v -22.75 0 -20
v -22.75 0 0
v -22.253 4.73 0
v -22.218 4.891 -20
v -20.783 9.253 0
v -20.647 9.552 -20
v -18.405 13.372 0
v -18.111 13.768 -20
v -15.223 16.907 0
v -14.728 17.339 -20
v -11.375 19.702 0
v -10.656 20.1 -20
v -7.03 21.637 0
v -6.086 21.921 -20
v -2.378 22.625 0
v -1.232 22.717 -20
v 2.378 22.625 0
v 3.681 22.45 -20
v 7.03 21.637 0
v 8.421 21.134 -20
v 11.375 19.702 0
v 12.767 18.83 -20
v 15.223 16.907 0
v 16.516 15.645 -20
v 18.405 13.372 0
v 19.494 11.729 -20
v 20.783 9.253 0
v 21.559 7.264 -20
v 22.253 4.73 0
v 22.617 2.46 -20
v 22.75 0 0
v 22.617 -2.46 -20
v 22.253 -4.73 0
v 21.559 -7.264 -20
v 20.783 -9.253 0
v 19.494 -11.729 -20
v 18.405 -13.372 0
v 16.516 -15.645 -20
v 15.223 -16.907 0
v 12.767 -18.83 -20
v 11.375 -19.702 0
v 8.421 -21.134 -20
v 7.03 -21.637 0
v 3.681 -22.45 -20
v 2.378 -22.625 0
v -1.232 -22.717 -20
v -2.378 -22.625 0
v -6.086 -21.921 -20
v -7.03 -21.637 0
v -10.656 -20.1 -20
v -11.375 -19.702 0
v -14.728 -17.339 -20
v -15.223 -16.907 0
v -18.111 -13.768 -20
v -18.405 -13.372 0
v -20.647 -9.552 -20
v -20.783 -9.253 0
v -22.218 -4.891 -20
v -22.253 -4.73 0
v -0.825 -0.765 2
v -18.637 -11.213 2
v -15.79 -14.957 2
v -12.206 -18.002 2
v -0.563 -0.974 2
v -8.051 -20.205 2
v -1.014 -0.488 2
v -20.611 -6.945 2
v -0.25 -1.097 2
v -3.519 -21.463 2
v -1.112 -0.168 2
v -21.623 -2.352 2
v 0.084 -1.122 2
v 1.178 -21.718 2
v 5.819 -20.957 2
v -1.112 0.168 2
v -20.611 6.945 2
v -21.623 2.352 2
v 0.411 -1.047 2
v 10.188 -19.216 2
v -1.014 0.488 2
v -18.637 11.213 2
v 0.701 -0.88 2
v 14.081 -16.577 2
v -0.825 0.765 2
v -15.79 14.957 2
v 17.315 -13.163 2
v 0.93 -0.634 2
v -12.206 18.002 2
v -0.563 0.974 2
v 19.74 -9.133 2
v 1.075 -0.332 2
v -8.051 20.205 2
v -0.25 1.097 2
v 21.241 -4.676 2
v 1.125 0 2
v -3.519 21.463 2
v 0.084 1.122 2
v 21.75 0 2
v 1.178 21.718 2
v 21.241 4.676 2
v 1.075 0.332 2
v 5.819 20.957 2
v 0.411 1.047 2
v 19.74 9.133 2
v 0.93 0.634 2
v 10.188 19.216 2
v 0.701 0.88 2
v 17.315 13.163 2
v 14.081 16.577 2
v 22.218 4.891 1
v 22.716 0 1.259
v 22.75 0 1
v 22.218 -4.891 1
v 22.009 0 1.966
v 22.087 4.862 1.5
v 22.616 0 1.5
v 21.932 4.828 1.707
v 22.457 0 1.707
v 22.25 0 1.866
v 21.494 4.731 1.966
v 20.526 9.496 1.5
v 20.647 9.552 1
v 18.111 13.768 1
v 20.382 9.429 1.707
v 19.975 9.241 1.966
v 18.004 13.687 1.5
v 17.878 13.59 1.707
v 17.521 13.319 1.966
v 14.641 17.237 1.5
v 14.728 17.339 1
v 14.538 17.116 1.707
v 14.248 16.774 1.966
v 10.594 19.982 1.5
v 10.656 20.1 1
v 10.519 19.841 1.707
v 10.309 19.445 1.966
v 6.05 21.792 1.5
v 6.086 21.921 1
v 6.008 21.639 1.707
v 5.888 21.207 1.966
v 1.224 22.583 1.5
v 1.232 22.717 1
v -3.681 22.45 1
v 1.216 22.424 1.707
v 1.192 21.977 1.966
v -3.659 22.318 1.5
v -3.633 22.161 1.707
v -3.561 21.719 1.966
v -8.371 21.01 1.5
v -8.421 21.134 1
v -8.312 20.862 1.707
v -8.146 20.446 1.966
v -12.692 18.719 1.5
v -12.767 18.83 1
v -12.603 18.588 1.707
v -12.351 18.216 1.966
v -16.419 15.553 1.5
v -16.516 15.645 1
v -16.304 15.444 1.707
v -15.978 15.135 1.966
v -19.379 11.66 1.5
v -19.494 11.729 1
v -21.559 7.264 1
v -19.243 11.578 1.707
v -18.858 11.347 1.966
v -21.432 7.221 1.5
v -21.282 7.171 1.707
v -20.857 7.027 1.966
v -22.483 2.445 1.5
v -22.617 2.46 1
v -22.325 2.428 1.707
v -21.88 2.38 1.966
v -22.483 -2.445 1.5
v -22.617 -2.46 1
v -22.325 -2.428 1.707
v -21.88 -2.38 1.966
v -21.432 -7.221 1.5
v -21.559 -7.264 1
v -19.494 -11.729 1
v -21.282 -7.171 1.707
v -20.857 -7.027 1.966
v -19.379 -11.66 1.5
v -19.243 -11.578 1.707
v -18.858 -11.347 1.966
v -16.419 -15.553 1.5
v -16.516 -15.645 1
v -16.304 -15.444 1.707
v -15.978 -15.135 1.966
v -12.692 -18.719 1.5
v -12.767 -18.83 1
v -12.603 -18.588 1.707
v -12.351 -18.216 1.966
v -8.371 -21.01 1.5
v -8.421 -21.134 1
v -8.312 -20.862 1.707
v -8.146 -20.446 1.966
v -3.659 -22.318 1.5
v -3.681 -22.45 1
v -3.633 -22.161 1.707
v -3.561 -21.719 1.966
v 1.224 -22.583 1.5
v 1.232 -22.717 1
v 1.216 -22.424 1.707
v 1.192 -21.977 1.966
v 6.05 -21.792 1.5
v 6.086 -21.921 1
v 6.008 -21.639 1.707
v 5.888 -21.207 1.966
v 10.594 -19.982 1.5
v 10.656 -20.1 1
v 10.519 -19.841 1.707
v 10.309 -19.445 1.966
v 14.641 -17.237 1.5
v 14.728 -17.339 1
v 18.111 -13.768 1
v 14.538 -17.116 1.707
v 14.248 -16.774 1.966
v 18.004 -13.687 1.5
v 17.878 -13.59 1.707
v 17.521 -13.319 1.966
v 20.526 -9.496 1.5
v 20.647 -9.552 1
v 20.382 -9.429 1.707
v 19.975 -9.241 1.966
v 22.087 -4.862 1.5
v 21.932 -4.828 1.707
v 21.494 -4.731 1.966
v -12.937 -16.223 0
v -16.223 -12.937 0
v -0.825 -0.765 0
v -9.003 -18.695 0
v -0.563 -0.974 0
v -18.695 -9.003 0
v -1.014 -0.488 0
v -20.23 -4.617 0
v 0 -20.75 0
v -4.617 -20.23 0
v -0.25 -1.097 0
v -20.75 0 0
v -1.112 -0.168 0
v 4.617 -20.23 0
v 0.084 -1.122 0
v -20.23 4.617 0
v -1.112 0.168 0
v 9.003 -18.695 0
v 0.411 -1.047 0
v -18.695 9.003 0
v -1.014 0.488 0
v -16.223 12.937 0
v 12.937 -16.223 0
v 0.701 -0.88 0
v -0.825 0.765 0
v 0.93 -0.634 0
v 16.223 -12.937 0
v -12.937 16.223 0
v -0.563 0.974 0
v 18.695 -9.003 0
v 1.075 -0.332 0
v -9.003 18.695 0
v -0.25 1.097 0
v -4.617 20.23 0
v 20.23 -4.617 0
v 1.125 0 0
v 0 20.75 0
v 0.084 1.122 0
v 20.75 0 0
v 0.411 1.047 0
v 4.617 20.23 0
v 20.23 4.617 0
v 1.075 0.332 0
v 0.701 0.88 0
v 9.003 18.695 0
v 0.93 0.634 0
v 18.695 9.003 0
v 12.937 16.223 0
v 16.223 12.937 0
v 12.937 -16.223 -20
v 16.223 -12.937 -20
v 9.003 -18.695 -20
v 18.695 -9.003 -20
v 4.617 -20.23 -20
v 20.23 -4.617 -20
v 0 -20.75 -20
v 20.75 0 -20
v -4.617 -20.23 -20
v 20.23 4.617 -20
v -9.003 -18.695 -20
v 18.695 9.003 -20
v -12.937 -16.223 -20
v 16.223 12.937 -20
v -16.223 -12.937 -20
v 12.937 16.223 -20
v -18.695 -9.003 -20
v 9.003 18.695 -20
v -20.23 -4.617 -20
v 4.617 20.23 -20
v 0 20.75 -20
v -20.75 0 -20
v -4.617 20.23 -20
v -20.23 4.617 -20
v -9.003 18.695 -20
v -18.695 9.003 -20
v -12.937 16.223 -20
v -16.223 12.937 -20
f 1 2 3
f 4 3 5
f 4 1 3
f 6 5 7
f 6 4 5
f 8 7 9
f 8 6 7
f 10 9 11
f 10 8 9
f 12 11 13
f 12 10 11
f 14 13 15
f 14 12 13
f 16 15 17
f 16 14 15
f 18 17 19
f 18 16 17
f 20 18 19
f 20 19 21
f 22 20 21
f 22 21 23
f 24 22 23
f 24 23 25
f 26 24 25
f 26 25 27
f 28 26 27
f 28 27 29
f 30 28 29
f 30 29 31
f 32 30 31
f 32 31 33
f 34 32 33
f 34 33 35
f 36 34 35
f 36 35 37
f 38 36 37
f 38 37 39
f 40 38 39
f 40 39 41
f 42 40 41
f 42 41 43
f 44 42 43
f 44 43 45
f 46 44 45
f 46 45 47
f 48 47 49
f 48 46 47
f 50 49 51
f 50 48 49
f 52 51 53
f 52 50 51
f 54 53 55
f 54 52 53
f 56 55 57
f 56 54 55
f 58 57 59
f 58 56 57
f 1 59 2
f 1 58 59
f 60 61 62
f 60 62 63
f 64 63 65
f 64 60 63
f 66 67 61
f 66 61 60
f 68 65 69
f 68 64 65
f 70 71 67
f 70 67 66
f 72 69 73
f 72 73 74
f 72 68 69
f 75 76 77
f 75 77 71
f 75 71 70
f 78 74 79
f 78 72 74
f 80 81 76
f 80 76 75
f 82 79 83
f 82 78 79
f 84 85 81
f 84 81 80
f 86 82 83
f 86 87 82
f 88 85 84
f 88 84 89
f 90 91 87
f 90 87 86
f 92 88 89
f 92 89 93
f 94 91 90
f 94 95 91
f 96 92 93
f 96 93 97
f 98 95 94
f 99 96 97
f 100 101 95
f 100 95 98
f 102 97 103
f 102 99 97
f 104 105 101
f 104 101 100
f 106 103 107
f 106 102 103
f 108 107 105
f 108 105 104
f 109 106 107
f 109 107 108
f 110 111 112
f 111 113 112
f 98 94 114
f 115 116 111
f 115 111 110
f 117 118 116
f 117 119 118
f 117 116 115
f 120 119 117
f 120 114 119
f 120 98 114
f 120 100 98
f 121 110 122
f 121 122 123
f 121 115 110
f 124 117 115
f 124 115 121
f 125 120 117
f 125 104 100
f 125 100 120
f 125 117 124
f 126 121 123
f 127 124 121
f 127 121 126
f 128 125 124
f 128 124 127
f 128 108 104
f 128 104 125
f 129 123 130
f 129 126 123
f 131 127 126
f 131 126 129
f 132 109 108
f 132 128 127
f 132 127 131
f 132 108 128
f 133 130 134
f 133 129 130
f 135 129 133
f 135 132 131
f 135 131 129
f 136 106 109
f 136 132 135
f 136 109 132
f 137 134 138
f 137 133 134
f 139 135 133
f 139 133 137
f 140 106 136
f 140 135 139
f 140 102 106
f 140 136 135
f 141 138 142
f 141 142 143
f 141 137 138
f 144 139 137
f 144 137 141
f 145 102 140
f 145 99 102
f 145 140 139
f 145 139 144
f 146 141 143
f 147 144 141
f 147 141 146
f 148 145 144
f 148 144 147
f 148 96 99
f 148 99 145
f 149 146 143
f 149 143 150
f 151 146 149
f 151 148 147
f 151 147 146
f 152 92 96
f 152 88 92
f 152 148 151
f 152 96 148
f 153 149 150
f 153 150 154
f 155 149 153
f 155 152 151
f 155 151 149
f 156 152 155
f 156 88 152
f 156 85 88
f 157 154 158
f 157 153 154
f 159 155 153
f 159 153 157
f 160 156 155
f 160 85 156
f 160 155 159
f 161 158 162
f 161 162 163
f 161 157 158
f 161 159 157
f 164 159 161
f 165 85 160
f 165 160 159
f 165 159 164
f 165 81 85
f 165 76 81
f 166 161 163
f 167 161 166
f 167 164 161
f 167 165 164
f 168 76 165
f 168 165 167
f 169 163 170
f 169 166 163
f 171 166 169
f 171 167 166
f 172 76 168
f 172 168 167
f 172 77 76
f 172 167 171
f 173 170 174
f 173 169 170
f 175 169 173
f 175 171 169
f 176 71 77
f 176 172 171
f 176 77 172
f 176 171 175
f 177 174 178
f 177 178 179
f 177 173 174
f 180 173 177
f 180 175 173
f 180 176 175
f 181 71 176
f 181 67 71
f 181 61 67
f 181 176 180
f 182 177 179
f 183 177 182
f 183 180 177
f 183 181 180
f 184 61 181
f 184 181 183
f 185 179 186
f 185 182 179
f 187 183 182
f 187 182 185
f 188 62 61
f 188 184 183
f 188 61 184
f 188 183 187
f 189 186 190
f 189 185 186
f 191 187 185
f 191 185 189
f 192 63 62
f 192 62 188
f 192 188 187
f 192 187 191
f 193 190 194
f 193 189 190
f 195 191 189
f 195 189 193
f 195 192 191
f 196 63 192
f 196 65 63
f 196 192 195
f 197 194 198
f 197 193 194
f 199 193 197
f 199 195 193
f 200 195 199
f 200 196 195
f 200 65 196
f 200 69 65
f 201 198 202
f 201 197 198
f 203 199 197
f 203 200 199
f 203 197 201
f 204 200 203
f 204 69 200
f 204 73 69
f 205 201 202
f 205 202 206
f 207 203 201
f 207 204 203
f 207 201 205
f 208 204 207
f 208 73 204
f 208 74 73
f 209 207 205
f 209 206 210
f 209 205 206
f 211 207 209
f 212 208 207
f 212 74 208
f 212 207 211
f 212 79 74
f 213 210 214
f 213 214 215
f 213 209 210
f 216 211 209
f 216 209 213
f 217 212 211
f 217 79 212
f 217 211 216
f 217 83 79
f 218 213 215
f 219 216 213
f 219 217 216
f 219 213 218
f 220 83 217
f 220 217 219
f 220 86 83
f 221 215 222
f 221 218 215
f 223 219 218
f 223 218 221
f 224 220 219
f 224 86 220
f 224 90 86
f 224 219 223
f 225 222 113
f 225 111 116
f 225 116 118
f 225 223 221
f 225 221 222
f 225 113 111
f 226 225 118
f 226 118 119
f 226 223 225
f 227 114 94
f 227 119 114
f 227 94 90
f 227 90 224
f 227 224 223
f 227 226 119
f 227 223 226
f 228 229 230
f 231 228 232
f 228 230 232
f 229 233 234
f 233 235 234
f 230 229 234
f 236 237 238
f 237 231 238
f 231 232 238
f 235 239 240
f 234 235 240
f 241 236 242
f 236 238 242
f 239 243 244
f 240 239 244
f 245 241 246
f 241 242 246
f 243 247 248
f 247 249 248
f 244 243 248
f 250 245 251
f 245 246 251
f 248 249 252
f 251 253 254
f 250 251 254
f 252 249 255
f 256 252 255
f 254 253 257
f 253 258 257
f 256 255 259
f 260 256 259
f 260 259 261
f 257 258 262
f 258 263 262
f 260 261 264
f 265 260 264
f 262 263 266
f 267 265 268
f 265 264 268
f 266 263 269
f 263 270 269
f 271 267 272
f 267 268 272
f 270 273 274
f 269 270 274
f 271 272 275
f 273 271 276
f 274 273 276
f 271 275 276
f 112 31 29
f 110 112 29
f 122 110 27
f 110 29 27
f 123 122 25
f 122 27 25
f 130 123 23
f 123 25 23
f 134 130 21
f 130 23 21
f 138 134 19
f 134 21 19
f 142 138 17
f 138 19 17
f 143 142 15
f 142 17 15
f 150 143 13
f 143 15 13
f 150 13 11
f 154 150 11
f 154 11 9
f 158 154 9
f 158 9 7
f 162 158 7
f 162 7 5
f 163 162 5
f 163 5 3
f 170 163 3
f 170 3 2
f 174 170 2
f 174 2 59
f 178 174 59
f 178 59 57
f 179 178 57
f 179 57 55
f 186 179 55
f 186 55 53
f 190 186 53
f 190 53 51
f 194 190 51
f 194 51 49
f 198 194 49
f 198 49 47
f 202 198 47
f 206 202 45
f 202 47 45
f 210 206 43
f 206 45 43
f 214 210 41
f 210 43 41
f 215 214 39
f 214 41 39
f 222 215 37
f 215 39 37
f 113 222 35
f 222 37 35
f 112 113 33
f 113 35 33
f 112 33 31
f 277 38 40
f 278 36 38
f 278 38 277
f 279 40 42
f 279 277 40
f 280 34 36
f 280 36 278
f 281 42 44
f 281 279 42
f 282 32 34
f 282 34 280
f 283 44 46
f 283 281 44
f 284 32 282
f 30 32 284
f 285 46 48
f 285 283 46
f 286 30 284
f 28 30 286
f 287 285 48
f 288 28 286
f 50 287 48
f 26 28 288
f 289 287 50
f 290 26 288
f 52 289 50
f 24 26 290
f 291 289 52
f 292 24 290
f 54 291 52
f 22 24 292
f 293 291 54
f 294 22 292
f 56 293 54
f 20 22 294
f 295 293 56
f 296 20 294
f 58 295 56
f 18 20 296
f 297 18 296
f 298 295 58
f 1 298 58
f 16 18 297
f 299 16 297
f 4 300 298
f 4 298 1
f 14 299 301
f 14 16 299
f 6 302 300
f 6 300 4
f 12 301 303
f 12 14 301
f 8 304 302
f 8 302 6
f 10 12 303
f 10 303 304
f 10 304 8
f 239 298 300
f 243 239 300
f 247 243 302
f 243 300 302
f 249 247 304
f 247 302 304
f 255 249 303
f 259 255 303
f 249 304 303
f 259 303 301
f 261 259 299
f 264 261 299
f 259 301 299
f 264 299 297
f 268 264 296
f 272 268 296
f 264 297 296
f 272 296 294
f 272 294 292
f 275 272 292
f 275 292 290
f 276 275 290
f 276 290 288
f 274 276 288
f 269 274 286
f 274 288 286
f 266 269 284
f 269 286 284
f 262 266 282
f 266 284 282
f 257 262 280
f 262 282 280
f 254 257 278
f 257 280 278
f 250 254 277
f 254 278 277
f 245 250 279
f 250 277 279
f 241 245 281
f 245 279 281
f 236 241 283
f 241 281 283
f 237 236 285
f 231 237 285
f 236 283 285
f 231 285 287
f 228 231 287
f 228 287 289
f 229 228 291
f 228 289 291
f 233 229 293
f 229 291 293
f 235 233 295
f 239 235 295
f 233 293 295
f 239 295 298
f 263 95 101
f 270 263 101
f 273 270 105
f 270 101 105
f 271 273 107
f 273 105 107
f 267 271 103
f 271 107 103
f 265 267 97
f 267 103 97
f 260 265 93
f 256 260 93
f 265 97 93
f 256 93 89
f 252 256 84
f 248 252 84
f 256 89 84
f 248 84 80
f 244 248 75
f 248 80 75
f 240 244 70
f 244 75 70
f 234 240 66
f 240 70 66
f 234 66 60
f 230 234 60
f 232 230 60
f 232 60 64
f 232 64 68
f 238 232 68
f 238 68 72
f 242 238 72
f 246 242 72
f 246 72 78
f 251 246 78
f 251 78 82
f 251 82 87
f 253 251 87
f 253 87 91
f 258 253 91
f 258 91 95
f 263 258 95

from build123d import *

# Parameters (mm, degrees)
SKETCH1_R           = 22.75
BOSS_EXTRUDE1_DEPTH = 2
BOSS_EXTRUDE2_START = 20
SKETCH2_R           = 22.75
SKETCH2_R_2         = 20.75
BOSS_EXTRUDE2_DEPTH = 20
FILLET1_R           = 1
SKETCH3_R           = 1.125
CUT_EXTRUDE1_DEPTH  = 20


with BuildPart() as part:
    # Sketch1 → Boss-Extrude1 (new body)
    with BuildSketch(Plane.XY):
        Circle(SKETCH1_R)
    extrude(amount=BOSS_EXTRUDE1_DEPTH)

    # Sketch2 → Boss-Extrude2 (add)
    with BuildSketch(Plane(origin=(0, 0, 0), x_dir=(-1, 0, 0), z_dir=(0, 0, -1)).offset(BOSS_EXTRUDE2_START)):
        Circle(SKETCH2_R)
        Circle(SKETCH2_R_2, mode=Mode.SUBTRACT)
    extrude(amount=-BOSS_EXTRUDE2_DEPTH)

    # Fillet1
    fillet1_edges = [part.edges().sort_by_distance(p)[0] for p in [
        (-22.75, 0, 2),
    ]]
    fillet(fillet1_edges, radius=FILLET1_R)

    # Sketch3 → Cut-Extrude1 (cut)
    with BuildSketch(Plane.XY.offset(2)):
        Circle(SKETCH3_R)
    extrude(amount=-CUT_EXTRUDE1_DEPTH, mode=Mode.SUBTRACT)


solid = part.part
